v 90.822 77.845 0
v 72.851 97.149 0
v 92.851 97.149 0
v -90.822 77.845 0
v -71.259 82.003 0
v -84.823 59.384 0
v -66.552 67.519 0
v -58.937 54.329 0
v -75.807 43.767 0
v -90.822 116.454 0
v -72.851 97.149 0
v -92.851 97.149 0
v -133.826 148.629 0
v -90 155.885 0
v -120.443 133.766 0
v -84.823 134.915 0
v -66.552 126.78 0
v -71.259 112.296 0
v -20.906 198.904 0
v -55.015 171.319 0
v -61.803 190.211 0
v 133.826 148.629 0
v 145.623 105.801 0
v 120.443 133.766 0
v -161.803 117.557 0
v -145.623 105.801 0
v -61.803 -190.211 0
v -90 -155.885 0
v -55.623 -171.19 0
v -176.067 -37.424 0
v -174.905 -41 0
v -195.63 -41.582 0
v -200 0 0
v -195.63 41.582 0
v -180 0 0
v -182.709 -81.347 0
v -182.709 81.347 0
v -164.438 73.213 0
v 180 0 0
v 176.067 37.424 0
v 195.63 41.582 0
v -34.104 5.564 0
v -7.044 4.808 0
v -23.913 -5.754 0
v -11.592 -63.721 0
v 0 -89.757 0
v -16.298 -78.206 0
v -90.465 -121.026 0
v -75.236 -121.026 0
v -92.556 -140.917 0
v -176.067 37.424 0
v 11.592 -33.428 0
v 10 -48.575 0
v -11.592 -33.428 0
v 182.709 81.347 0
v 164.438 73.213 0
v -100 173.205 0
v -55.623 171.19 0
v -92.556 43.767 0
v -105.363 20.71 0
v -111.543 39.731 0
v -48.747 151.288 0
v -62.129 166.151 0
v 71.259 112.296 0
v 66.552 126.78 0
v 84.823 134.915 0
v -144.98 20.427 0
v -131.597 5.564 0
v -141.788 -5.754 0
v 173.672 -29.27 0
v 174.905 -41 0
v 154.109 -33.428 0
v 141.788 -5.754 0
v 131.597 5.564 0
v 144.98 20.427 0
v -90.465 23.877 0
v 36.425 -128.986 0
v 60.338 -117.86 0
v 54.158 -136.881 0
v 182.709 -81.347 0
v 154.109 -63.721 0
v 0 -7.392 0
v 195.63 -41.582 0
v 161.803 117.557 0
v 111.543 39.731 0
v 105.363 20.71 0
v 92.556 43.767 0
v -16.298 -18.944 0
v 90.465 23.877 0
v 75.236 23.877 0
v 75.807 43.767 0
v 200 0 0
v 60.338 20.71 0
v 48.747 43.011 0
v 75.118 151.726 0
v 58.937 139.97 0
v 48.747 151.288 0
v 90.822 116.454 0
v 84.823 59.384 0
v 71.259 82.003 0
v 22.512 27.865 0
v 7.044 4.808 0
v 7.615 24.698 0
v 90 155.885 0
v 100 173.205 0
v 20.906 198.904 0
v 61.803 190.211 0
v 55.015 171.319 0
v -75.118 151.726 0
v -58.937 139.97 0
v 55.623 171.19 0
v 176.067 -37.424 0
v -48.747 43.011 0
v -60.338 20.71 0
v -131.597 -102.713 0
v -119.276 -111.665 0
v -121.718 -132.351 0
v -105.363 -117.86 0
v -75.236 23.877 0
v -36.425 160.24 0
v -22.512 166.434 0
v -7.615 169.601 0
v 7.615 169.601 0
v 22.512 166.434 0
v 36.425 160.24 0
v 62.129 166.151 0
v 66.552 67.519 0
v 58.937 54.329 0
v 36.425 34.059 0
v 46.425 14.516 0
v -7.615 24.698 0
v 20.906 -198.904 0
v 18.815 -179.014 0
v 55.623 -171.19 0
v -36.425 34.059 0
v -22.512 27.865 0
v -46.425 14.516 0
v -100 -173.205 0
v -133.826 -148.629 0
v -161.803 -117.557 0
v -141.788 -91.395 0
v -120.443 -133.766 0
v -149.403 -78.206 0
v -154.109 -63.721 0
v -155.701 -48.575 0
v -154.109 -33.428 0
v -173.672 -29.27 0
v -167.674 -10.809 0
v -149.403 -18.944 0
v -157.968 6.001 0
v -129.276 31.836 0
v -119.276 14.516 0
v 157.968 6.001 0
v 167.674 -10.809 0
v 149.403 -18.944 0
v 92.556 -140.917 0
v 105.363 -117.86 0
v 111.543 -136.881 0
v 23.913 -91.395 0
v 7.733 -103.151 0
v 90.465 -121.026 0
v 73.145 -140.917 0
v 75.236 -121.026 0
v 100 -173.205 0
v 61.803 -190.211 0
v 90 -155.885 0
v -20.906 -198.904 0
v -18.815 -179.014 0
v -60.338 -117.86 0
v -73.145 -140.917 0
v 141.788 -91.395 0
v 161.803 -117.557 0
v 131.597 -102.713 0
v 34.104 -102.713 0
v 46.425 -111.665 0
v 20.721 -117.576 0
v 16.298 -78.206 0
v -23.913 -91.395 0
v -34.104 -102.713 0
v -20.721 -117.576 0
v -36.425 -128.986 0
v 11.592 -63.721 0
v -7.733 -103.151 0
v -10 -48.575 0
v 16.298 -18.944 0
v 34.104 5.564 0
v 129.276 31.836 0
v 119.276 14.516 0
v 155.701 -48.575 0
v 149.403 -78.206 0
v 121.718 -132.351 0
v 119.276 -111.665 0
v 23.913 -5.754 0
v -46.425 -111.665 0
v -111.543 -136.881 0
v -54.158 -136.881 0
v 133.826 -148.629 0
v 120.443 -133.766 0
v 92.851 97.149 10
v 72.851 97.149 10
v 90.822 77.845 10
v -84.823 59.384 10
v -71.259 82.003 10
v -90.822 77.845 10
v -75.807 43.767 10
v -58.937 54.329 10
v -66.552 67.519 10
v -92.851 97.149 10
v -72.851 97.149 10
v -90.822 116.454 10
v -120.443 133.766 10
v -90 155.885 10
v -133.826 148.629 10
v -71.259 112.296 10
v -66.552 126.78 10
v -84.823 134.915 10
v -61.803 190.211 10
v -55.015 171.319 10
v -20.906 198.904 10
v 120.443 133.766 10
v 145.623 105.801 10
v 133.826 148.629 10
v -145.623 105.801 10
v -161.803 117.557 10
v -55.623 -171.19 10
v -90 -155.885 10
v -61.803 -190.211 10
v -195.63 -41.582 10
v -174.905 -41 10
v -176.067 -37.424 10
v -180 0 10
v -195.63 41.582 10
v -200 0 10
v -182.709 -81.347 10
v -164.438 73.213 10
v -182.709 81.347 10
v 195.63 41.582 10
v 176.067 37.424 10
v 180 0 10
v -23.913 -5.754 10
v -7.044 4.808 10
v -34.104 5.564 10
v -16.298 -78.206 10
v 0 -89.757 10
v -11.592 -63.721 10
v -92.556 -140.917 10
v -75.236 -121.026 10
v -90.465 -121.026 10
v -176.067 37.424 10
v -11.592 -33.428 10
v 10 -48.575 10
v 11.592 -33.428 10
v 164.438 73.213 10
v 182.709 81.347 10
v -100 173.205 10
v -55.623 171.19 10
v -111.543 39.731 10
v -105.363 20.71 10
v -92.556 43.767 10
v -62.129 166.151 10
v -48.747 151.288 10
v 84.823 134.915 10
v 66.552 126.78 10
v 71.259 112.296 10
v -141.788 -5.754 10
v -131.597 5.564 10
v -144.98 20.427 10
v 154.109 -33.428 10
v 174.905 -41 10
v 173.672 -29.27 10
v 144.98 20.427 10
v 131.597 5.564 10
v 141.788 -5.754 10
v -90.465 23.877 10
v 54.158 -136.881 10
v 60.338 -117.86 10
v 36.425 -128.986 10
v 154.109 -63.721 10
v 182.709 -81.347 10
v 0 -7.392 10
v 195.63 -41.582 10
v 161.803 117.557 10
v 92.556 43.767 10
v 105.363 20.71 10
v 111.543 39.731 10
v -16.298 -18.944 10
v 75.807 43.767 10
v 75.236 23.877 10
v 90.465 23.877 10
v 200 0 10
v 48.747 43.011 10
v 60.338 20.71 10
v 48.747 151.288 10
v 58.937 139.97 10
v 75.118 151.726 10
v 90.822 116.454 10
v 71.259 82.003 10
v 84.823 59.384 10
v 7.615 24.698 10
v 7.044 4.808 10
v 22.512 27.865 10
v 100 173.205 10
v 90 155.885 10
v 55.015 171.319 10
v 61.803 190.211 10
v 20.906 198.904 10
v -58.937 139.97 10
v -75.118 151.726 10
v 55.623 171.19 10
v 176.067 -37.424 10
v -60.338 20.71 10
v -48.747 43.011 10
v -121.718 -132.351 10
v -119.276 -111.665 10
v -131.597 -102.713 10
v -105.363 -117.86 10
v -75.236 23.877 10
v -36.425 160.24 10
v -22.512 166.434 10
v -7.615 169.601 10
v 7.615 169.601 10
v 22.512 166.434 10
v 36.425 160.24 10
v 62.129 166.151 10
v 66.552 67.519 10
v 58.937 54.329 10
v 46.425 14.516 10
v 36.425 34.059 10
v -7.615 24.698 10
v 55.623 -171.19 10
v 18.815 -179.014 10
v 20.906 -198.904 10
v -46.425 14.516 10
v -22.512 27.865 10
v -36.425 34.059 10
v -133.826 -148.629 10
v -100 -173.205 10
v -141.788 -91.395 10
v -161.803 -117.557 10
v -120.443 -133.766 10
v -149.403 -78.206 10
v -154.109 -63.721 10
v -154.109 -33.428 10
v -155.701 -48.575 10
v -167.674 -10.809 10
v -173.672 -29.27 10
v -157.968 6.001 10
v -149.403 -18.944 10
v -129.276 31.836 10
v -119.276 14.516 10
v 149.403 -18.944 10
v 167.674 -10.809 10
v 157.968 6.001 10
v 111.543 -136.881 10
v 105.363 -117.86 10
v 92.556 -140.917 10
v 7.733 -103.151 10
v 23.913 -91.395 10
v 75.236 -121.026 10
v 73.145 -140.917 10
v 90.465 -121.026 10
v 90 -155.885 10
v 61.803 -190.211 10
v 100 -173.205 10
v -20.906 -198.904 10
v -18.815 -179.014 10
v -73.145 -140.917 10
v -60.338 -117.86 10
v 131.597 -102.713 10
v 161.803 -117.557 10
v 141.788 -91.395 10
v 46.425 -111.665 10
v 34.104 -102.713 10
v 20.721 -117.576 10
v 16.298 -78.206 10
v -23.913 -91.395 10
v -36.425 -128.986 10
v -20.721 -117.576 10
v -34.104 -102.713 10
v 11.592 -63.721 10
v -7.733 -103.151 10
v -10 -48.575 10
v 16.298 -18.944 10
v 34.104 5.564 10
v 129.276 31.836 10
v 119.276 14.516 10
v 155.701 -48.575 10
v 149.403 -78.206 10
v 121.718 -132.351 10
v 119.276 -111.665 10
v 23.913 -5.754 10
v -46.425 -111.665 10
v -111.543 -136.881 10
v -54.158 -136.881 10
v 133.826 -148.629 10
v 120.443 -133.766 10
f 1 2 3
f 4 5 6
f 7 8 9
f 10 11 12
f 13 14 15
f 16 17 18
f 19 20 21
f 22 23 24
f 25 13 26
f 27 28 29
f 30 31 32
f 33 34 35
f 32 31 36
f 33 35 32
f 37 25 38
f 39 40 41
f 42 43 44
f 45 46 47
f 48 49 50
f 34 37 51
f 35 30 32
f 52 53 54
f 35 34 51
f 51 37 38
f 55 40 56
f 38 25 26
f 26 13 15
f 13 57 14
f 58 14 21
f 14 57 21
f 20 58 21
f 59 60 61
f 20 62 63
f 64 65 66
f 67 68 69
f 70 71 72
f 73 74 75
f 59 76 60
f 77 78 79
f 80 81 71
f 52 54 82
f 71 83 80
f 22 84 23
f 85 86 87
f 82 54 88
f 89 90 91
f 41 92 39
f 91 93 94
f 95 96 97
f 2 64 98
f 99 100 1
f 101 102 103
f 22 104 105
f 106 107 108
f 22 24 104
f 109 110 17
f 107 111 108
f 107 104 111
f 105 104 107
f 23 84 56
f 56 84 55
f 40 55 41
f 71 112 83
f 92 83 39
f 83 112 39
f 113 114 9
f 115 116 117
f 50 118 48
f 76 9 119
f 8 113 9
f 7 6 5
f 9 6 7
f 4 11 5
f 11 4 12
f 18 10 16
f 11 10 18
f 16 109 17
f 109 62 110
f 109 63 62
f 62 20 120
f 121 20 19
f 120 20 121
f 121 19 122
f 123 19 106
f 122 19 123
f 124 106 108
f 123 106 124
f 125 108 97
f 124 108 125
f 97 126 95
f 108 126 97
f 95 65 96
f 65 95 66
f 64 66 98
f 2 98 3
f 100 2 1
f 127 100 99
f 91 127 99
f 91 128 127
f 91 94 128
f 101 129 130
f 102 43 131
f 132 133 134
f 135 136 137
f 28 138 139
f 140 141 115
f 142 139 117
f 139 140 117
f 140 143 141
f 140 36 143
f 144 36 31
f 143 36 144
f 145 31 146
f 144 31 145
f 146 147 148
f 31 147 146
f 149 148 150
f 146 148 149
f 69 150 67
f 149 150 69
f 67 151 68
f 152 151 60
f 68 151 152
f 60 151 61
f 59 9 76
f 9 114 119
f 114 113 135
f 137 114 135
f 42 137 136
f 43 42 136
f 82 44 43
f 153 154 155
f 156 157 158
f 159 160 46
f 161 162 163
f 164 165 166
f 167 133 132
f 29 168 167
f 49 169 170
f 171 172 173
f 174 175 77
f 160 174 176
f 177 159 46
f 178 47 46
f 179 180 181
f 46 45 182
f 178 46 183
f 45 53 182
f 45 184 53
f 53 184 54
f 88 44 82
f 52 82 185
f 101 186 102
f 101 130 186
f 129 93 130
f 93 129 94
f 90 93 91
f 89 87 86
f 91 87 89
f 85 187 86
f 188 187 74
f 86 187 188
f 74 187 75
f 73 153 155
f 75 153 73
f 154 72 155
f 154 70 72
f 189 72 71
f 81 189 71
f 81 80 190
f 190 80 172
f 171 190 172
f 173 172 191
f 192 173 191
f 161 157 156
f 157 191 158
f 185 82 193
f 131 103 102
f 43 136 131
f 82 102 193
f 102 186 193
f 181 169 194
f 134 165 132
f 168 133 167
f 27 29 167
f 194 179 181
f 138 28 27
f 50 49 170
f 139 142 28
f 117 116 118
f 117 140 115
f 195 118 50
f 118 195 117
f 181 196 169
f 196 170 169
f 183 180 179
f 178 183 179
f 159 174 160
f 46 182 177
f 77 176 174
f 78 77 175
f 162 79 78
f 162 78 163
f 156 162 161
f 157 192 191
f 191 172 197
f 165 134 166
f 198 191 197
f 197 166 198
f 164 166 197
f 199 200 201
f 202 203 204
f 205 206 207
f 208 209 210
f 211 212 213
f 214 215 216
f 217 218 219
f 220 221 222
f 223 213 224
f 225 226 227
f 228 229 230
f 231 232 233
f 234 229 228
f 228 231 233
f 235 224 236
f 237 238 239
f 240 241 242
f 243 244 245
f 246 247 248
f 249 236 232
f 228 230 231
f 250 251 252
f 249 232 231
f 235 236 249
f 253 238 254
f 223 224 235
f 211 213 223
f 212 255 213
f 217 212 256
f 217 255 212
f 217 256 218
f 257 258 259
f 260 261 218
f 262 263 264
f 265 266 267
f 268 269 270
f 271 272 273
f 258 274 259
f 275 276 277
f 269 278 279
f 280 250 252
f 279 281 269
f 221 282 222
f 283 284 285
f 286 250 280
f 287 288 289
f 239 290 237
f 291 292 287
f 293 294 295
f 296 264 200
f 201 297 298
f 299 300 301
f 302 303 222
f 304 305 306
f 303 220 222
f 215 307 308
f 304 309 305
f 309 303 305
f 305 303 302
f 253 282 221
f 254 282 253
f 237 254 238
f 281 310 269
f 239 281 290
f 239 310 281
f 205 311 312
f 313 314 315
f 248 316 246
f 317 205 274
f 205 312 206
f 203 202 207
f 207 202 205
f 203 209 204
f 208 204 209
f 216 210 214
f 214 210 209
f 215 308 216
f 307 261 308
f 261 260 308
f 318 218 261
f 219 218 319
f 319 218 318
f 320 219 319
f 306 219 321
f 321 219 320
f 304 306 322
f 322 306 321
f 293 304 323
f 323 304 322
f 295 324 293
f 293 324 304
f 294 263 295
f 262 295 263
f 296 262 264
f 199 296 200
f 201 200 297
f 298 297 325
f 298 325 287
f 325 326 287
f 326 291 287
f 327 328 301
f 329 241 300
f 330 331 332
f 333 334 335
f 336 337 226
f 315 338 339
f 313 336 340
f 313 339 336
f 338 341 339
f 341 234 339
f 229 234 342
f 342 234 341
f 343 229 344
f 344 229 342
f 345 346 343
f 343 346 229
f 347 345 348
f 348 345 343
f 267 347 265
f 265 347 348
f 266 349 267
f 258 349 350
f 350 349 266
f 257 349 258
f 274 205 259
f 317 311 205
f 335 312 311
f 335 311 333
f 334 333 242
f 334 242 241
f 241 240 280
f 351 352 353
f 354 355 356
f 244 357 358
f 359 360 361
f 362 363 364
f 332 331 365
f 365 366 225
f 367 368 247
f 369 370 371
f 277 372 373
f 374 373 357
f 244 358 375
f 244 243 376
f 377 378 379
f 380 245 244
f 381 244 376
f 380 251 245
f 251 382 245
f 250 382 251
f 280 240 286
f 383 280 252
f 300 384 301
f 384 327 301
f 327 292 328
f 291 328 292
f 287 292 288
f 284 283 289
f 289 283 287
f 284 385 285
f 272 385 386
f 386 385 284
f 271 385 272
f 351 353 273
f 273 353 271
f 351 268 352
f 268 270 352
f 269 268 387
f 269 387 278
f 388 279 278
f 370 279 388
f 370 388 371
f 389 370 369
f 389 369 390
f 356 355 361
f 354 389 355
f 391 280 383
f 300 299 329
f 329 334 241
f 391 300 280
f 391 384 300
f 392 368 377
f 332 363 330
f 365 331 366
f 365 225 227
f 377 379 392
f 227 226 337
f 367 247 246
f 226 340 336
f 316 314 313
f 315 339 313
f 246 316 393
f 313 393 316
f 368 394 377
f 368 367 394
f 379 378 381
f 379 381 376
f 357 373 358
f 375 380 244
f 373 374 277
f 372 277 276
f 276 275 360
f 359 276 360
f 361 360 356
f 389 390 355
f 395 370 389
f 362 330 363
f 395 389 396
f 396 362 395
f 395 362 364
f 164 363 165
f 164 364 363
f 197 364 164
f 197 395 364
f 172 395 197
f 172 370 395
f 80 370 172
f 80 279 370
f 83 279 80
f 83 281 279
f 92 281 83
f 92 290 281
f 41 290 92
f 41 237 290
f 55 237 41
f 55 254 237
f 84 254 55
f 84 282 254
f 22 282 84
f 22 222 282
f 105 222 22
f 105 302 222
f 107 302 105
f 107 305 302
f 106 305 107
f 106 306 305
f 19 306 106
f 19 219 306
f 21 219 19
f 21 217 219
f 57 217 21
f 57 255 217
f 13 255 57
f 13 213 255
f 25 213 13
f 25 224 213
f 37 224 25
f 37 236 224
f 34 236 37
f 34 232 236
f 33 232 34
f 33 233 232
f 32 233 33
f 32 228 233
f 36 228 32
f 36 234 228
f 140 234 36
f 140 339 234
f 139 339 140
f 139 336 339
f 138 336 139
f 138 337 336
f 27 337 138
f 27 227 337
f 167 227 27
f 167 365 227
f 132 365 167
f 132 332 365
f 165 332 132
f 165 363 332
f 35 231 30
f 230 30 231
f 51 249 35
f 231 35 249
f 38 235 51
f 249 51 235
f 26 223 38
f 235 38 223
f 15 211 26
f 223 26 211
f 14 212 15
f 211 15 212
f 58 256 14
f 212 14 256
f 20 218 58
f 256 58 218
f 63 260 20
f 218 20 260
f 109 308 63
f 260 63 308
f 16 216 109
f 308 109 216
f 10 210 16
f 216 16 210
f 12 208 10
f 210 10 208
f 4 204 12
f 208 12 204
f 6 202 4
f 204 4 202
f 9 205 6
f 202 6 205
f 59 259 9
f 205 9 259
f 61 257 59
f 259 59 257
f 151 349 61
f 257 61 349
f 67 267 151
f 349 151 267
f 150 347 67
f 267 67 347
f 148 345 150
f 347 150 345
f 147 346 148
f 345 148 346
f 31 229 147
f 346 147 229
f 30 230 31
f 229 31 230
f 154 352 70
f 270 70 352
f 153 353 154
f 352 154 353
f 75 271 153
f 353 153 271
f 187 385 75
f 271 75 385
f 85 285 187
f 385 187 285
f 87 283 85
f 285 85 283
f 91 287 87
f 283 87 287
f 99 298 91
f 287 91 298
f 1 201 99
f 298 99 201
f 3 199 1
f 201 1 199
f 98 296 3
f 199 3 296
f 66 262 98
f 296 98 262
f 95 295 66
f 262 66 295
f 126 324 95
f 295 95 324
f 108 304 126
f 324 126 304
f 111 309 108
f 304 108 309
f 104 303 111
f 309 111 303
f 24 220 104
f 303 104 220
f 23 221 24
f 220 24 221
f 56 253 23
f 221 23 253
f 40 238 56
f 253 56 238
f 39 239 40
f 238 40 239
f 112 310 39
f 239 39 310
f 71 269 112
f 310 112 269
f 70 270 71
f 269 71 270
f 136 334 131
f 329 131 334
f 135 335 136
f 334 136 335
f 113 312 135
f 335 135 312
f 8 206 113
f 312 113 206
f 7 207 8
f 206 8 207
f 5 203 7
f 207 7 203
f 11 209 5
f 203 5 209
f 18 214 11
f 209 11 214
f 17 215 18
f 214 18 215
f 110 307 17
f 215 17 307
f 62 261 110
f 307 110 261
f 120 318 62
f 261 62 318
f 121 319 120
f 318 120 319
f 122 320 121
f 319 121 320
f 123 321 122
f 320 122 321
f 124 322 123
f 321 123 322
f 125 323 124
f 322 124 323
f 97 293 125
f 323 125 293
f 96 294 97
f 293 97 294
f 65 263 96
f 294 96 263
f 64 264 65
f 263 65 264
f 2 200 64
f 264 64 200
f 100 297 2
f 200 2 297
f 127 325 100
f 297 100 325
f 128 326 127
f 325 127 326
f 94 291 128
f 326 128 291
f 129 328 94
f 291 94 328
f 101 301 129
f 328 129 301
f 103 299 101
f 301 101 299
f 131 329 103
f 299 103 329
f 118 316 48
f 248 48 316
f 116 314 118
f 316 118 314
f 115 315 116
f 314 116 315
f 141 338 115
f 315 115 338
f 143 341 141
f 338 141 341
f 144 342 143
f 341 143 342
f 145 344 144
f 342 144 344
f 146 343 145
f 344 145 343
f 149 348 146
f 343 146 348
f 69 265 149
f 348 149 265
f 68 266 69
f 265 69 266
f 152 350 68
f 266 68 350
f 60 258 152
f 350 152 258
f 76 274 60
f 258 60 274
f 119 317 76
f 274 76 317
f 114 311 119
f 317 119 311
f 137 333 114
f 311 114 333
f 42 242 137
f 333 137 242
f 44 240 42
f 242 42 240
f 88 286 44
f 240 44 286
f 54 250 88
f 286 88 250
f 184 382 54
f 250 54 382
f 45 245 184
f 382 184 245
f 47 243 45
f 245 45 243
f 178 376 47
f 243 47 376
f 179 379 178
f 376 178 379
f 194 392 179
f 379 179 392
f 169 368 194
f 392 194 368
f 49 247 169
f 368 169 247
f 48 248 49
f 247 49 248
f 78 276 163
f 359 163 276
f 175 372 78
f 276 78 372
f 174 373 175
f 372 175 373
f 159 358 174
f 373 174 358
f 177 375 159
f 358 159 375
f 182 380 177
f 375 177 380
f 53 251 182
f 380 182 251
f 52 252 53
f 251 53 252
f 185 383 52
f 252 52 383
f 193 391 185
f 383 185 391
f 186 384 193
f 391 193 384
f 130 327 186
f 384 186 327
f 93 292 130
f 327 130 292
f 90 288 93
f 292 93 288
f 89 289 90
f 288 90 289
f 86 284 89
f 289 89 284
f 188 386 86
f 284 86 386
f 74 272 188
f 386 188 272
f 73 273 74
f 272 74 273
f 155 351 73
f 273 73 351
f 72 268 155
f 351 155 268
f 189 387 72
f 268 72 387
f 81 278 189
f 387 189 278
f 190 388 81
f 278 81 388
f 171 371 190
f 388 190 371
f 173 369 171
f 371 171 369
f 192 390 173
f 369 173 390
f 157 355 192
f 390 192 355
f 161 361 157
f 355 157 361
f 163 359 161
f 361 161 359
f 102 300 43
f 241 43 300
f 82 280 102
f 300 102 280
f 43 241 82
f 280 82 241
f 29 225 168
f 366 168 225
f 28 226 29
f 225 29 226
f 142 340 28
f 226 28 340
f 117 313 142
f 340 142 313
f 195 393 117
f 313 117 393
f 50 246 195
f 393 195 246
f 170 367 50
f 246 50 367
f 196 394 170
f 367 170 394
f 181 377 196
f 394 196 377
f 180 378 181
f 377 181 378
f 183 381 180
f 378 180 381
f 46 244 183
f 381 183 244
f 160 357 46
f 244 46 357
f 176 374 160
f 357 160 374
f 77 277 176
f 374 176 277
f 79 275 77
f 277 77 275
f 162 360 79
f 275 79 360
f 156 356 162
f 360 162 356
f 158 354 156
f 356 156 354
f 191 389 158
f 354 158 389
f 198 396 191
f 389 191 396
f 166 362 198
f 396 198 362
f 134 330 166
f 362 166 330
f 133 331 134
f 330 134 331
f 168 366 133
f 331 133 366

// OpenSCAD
$fn=30;

module Kreisfenster(R,W,H,O)
{
  O = 3; //only support for 3, yet
  phi=45;
  largeOuter=R;
  largeInner=largeOuter-W;
  smallOuter=R/2.154;
  smallInner=smallOuter-W;
 
  translateFactor = largeOuter-smallOuter-W/2; 
  
  
  linear_extrude(H)
  {
    difference()
    {
      circle(largeOuter);
      circle(largeInner);
    }
  
    translate([0,translateFactor,0])
    {
      difference()
      {
        circle(smallOuter);
        circle(smallInner);
      }
    }
    
    translate([-smallOuter+W/2,-translateFactor*0.5,0])
    {
      difference()
      {
        circle(smallOuter);
        circle(smallInner);
      }
    }

    translate([+smallOuter-W/2,-translateFactor*0.5,0])
    {
      difference()
      {
        circle(smallOuter);
        circle(smallInner);
      }
    }

  } //extrude
}

Kreisfenster(200, 20, 10, 3);
